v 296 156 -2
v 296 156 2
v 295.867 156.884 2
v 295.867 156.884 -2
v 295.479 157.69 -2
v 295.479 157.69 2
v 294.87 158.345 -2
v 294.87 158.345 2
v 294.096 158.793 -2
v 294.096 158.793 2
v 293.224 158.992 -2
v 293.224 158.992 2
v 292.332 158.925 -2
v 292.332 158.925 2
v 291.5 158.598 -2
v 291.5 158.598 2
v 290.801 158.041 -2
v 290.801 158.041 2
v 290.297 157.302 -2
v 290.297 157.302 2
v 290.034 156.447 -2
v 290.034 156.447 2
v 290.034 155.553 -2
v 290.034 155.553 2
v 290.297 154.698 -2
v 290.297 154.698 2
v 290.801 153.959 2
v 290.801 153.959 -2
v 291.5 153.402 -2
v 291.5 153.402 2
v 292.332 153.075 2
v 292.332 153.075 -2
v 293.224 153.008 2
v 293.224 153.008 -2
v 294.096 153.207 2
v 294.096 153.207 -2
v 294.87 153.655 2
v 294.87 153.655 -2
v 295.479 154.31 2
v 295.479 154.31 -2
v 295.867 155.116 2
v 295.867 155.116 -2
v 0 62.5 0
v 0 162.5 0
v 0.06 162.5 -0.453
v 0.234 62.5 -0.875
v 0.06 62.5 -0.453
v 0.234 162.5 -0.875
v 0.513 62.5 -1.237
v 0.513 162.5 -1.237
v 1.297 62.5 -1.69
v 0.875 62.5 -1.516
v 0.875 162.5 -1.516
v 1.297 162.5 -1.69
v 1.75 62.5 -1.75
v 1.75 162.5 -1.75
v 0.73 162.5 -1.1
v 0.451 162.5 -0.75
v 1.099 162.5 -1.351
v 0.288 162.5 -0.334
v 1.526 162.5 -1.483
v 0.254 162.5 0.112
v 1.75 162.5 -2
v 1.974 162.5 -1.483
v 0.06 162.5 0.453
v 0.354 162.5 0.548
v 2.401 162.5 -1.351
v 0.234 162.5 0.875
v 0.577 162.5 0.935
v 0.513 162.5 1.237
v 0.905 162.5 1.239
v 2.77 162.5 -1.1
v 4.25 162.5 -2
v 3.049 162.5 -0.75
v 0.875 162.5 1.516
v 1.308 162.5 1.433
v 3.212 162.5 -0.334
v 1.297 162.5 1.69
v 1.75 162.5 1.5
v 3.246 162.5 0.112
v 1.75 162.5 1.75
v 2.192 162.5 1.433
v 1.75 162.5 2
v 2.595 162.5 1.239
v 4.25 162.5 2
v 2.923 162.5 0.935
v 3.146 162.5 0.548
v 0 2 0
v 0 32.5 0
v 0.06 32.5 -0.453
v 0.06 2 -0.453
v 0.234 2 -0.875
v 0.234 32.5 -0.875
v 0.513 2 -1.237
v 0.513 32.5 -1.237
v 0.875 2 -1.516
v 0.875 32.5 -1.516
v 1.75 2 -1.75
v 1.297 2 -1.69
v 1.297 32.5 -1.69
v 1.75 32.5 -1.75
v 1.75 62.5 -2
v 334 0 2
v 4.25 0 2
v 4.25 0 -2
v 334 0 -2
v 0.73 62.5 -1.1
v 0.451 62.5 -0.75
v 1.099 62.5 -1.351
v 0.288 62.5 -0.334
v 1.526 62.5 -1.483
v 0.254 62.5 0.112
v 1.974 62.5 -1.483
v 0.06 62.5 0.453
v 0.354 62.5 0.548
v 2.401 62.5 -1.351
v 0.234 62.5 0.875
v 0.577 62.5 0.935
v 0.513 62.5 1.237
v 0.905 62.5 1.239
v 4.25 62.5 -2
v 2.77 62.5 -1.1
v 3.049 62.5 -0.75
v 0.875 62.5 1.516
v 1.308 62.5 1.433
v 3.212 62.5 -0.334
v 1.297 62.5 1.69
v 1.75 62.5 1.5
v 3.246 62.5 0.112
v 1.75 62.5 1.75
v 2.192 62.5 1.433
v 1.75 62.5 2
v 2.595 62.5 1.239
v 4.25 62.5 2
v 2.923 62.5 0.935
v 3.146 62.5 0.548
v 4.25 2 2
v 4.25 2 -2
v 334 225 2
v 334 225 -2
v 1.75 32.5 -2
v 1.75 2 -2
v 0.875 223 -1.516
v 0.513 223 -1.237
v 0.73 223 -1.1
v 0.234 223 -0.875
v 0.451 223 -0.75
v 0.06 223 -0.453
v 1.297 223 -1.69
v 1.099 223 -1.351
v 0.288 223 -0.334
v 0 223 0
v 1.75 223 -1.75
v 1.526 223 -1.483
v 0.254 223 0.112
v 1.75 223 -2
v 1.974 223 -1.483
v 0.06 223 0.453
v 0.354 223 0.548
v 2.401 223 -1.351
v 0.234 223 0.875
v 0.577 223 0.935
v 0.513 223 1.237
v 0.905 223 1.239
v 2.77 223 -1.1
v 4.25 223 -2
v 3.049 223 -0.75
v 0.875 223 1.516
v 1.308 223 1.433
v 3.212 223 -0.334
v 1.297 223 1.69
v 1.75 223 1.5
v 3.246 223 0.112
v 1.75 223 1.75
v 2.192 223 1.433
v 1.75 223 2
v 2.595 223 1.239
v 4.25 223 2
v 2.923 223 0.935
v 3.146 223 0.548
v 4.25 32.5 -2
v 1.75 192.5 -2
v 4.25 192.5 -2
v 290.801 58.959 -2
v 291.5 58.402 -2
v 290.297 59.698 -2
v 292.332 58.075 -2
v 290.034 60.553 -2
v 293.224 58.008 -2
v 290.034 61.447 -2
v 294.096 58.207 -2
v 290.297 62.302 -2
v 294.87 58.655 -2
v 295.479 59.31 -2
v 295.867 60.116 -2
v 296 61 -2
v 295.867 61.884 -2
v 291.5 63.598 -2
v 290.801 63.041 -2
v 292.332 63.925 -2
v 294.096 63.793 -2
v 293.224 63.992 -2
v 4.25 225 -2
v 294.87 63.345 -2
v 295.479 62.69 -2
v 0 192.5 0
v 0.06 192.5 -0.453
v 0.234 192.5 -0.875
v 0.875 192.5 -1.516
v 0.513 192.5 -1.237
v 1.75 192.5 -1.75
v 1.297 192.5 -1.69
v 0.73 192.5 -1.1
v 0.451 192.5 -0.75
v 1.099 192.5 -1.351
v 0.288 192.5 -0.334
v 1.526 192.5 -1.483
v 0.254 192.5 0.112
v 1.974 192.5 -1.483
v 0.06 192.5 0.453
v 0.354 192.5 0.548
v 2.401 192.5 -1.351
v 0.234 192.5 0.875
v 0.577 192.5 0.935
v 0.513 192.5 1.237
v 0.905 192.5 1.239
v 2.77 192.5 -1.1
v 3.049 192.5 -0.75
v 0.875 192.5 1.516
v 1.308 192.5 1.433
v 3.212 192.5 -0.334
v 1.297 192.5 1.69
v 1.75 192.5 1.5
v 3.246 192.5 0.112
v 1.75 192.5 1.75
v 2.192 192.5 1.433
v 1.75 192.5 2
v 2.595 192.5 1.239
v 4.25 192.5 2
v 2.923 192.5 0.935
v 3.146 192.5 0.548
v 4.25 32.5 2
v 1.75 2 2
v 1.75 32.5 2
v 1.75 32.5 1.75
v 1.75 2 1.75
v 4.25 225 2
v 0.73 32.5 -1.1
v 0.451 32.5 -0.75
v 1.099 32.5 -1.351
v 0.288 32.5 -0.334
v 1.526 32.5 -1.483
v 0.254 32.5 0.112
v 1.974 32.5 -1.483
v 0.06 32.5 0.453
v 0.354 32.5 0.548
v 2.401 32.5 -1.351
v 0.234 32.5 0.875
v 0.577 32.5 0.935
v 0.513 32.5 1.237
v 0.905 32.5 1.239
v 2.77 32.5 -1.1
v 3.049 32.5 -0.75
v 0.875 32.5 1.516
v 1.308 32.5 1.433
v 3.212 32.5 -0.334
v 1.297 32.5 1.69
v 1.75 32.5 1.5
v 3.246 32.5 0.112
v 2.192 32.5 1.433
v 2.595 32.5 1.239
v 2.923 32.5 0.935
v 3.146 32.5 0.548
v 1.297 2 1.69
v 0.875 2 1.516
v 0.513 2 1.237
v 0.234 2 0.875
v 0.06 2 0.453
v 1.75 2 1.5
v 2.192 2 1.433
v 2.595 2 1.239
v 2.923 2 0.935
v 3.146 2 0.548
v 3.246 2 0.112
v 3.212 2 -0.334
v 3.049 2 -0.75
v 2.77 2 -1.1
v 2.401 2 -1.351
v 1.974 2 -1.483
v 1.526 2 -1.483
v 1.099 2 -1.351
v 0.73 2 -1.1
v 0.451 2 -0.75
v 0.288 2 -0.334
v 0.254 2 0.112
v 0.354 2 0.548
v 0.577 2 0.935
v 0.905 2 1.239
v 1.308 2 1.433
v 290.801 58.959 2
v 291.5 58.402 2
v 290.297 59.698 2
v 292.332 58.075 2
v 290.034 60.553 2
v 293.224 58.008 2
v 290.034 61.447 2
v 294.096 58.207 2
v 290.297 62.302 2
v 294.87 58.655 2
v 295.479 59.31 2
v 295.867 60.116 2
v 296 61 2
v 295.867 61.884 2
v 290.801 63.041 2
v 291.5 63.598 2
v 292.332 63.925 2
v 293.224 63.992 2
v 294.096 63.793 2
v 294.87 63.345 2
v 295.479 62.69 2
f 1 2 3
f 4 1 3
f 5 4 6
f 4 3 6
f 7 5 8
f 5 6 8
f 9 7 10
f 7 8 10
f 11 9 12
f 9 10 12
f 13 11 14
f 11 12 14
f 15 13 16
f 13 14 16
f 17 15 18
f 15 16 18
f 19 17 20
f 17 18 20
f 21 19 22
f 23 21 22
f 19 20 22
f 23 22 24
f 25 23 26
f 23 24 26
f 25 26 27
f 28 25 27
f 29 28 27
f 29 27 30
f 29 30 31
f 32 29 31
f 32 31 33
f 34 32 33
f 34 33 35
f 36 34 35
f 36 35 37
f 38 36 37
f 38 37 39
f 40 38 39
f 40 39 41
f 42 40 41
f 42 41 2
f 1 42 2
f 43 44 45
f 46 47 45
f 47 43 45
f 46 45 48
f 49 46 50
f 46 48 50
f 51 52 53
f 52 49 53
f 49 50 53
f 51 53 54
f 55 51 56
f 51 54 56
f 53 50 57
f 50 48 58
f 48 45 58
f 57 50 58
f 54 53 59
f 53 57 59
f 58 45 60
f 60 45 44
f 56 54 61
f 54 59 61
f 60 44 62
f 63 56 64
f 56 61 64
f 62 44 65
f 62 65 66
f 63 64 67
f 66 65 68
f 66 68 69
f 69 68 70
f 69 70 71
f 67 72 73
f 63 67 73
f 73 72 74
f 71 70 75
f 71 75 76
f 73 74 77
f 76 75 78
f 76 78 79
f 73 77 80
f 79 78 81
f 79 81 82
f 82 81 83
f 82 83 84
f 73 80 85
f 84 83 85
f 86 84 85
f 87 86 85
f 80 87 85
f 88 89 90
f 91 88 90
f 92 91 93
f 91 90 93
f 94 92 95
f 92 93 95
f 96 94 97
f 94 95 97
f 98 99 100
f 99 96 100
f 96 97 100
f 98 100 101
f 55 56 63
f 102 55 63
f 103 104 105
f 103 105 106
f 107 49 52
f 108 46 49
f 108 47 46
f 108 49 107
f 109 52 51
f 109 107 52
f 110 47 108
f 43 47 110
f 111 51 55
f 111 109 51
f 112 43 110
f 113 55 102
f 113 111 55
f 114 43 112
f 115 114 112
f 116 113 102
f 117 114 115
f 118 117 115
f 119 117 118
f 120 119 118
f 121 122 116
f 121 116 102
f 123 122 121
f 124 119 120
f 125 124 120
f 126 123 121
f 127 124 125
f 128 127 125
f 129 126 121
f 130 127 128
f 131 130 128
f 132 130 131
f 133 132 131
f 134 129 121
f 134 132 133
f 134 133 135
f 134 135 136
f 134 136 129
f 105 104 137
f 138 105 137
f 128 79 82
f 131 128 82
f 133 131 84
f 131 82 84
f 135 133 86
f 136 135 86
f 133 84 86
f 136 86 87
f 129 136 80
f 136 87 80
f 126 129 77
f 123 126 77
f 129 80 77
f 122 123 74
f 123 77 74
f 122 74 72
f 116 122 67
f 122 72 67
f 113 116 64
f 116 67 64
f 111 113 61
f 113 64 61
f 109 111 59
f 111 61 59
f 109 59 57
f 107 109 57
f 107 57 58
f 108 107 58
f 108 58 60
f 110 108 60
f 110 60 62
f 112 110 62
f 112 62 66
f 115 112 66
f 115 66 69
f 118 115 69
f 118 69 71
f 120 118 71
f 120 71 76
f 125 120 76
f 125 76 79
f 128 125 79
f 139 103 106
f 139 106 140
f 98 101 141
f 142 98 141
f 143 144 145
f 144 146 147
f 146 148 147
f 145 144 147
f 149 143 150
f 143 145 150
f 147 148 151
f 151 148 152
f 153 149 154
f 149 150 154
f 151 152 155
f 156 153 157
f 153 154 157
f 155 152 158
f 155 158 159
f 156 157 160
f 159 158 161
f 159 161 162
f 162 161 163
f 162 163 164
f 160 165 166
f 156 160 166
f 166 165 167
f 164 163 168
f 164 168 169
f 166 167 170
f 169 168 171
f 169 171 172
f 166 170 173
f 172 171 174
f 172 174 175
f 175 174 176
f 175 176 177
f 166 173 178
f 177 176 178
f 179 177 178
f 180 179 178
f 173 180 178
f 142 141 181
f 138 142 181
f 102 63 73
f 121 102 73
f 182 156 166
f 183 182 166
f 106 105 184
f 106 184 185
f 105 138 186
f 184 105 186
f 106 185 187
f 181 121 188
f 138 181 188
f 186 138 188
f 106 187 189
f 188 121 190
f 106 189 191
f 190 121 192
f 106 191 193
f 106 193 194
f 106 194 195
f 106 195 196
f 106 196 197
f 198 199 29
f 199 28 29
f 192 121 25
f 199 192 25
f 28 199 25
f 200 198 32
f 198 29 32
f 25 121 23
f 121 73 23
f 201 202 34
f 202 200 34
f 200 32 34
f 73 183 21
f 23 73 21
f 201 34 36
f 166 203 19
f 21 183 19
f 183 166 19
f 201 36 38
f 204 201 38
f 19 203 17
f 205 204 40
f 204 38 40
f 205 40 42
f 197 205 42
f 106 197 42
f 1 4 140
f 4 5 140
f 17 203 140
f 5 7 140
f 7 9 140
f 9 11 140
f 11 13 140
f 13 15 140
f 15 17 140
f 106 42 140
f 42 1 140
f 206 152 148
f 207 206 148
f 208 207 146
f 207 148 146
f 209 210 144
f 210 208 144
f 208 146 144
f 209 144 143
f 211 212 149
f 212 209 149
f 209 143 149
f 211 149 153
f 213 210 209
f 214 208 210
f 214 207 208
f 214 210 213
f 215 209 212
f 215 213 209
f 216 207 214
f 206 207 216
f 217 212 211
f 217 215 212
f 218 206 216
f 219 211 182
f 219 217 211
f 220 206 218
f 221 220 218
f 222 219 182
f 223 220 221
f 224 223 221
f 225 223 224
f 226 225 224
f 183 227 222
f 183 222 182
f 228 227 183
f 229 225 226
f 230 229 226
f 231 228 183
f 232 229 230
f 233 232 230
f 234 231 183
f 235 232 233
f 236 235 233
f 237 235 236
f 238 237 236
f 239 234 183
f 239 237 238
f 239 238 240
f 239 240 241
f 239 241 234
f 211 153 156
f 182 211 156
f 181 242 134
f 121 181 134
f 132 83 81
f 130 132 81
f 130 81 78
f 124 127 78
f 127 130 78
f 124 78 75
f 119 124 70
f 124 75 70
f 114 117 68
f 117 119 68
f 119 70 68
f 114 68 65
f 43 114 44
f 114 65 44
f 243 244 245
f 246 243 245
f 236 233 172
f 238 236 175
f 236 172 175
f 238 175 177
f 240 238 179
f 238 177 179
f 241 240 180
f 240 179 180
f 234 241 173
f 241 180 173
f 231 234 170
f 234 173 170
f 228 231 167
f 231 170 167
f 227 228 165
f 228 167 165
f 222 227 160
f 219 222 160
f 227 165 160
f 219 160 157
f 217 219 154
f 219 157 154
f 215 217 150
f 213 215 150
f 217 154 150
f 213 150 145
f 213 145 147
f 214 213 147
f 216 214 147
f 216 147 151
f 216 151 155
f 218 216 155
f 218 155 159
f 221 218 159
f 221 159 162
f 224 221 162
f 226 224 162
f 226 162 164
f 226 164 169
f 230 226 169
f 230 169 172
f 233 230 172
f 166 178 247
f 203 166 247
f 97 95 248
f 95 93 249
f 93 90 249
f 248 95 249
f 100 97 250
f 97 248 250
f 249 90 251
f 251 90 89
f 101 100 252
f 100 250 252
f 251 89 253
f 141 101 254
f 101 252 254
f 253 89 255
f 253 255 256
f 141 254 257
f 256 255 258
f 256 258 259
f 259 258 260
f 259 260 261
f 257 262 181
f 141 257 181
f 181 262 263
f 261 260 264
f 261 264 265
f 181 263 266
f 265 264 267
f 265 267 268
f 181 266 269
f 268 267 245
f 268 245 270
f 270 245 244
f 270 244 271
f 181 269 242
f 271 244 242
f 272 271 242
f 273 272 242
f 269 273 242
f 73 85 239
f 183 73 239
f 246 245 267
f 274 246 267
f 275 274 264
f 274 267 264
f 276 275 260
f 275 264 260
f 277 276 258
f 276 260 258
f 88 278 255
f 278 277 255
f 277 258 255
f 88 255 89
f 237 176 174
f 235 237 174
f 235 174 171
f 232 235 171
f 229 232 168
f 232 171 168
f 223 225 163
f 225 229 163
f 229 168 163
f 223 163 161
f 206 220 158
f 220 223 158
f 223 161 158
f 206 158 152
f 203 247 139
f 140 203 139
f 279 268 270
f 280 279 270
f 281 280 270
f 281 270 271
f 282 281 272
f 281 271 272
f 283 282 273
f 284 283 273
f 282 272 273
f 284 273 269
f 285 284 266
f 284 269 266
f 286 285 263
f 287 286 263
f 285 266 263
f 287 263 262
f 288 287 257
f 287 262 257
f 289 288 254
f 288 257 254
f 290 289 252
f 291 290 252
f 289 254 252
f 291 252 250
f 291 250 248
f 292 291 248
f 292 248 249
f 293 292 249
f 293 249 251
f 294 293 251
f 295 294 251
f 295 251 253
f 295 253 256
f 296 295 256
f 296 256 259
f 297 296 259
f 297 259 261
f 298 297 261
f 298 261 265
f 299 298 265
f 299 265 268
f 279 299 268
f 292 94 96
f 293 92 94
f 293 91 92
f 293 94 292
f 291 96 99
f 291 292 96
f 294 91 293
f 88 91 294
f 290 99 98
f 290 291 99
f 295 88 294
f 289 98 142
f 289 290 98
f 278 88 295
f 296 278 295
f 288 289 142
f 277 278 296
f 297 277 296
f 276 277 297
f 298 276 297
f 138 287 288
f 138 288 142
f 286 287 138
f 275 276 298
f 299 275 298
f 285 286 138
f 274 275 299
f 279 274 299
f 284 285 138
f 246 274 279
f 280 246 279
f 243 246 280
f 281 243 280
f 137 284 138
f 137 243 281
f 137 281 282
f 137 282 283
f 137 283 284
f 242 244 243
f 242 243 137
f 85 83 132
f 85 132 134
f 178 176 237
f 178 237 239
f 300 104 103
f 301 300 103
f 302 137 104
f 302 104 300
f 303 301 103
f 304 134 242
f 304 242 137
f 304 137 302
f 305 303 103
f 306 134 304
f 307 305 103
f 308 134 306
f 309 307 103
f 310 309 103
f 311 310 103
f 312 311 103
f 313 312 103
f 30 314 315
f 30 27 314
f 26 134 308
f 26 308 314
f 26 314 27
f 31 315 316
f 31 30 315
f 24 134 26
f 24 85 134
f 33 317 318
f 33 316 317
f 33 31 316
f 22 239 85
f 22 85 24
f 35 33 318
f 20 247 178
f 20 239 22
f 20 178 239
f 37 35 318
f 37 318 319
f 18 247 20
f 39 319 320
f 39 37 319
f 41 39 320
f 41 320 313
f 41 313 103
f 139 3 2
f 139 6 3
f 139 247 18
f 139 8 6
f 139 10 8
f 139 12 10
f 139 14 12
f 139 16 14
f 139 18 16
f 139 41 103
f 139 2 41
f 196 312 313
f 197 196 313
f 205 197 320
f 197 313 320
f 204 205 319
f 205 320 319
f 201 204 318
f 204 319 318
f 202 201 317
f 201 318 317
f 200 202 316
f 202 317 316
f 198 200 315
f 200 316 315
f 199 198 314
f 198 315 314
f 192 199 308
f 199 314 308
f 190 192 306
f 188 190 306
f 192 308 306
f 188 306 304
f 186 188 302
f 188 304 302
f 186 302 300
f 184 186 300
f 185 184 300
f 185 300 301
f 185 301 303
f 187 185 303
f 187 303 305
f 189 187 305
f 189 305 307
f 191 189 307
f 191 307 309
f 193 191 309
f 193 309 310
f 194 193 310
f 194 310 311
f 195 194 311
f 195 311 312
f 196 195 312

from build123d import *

# Parameters (mm, degrees)
SKETCH2_W           = 334
SKETCH2_H           = 225
BOSS_EXTRUDE1_DEPTH = 2
SKETCH3_R           = 1.5
CUT_EXTRUDE1_DEPTH  = 403.721988473
SKETCH4_W           = 4.25
SKETCH4_H           = 30
CUT_EXTRUDE2_DEPTH  = 403.736886813
SKETCH5_W           = 4.25
SKETCH5_H           = 2
CUT_EXTRUDE3_DEPTH  = 403.736886813
SKETCH6_R           = 3
CUT_EXTRUDE4_DEPTH  = 10


with BuildPart() as part:
    # Sketch2 → Boss-Extrude1 (new, symmetric)
    with BuildSketch(Plane.XY):
        with Locations((167, 112.5)):
            Rectangle(SKETCH2_W, SKETCH2_H)
    extrude(amount=BOSS_EXTRUDE1_DEPTH, both=True)

    # Sketch3 → Cut-Extrude1 (cut, through all)
    with BuildSketch(Plane(origin=(0, 225, 0), x_dir=(1, 0, 0), z_dir=(0, 1, 0))):
        with BuildLine():
            ThreePointArc((0, 0), (0.512563133, 1.237436867), (1.75, 1.75))
            Line((1.75, 1.75), (1.75, 2))
            Line((1.75, 2), (0, 2))
            Line((0, 2), (0, 0))
        make_face()
        with BuildLine():
            ThreePointArc((1.75, -1.75), (0.512563133, -1.237436867), (0, 0))
            Line((0, 0), (0, -2))
            Line((0, -2), (1.75, -2))
            Line((1.75, -2), (1.75, -1.75))
        make_face()
        with Locations(Location((1.75, 0, 0), (0, 0, 270))):
            Circle(SKETCH3_R)
    extrude(amount=-CUT_EXTRUDE1_DEPTH, mode=Mode.SUBTRACT)

    # Sketch4 → Cut-Extrude2 (cut, through all)
    with BuildSketch(Plane.XY.offset(2)):
        with Locations((2.125, 177.5)):
            Rectangle(SKETCH4_W, SKETCH4_H)
        with Locations((2.125, 47.5)):
            Rectangle(SKETCH4_W, SKETCH4_H)
    extrude(amount=-CUT_EXTRUDE2_DEPTH, mode=Mode.SUBTRACT)

    # Sketch5 → Cut-Extrude3 (cut, through all)
    with BuildSketch(Plane.XY.offset(2)):
        with Locations((2.125, 224)):
            Rectangle(SKETCH5_W, SKETCH5_H)
        with Locations((2.125, 1)):
            Rectangle(SKETCH5_W, SKETCH5_H)
    extrude(amount=-CUT_EXTRUDE3_DEPTH, mode=Mode.SUBTRACT)

    # Sketch6 → Cut-Extrude4 (cut)
    with BuildSketch(Plane.XY.offset(2)):
        with Locations((293, 155.999999999)):
            Circle(SKETCH6_R)
        with Locations((293, 60.999999999)):
            Circle(SKETCH6_R)
    extrude(amount=-CUT_EXTRUDE4_DEPTH, mode=Mode.SUBTRACT)


solid = part.part
